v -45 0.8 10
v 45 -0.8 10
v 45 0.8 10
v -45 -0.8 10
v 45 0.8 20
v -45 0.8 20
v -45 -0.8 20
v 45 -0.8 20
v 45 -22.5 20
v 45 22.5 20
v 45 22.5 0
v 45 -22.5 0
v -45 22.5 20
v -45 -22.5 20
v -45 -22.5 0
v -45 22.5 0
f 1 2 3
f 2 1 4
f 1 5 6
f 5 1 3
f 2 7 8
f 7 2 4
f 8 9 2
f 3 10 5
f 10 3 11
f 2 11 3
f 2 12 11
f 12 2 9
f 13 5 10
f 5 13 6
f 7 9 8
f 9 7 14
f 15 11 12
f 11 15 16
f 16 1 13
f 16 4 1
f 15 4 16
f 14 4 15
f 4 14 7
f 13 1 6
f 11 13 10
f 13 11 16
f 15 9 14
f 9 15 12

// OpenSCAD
// Microscope slide drying rack
// Print orientation: base block on the bed (z = 0), slots open upward (+Z)

// ---------------- Parameters ----------------
block_len    = 90;    // base block length along X (mm)
block_wid    = 45;    // base block width along Y (mm)
block_h      = 20;    // base block height along Z (mm)

slot_count   = 10;    // number of slide slots
slot_len     = 77;    // slot length along X (mm)
slot_w       = 1.6;   // slot width along Y (mm)
slot_depth   = 10;    // slot depth from top face (mm)
slot_pitch   = 3.5;   // centre-to-centre slot spacing along Y (mm)

eps          = 0.5;   // overcut past faces to avoid coplanar surfaces (mm)

$fn = 64;

// ---------------- Model ----------------
difference() {
    // Solid base block, centred in X and Y, sitting on z = 0
    translate([-block_len / 2, -block_wid / 2, 0])
        cube([block_len, block_wid, block_h]);

    // Parallel slots running along X, centred as a group in X and Y
    for (i = [0 : slot_count - 1]) {
        x = (i - (slot_count - 1) / 2) * slot_pitch;
        translate([x - slot_len / 2, -slot_w / 2, block_h - slot_depth])
            cube([slot_len, slot_w, slot_depth + eps]);
    }
}
